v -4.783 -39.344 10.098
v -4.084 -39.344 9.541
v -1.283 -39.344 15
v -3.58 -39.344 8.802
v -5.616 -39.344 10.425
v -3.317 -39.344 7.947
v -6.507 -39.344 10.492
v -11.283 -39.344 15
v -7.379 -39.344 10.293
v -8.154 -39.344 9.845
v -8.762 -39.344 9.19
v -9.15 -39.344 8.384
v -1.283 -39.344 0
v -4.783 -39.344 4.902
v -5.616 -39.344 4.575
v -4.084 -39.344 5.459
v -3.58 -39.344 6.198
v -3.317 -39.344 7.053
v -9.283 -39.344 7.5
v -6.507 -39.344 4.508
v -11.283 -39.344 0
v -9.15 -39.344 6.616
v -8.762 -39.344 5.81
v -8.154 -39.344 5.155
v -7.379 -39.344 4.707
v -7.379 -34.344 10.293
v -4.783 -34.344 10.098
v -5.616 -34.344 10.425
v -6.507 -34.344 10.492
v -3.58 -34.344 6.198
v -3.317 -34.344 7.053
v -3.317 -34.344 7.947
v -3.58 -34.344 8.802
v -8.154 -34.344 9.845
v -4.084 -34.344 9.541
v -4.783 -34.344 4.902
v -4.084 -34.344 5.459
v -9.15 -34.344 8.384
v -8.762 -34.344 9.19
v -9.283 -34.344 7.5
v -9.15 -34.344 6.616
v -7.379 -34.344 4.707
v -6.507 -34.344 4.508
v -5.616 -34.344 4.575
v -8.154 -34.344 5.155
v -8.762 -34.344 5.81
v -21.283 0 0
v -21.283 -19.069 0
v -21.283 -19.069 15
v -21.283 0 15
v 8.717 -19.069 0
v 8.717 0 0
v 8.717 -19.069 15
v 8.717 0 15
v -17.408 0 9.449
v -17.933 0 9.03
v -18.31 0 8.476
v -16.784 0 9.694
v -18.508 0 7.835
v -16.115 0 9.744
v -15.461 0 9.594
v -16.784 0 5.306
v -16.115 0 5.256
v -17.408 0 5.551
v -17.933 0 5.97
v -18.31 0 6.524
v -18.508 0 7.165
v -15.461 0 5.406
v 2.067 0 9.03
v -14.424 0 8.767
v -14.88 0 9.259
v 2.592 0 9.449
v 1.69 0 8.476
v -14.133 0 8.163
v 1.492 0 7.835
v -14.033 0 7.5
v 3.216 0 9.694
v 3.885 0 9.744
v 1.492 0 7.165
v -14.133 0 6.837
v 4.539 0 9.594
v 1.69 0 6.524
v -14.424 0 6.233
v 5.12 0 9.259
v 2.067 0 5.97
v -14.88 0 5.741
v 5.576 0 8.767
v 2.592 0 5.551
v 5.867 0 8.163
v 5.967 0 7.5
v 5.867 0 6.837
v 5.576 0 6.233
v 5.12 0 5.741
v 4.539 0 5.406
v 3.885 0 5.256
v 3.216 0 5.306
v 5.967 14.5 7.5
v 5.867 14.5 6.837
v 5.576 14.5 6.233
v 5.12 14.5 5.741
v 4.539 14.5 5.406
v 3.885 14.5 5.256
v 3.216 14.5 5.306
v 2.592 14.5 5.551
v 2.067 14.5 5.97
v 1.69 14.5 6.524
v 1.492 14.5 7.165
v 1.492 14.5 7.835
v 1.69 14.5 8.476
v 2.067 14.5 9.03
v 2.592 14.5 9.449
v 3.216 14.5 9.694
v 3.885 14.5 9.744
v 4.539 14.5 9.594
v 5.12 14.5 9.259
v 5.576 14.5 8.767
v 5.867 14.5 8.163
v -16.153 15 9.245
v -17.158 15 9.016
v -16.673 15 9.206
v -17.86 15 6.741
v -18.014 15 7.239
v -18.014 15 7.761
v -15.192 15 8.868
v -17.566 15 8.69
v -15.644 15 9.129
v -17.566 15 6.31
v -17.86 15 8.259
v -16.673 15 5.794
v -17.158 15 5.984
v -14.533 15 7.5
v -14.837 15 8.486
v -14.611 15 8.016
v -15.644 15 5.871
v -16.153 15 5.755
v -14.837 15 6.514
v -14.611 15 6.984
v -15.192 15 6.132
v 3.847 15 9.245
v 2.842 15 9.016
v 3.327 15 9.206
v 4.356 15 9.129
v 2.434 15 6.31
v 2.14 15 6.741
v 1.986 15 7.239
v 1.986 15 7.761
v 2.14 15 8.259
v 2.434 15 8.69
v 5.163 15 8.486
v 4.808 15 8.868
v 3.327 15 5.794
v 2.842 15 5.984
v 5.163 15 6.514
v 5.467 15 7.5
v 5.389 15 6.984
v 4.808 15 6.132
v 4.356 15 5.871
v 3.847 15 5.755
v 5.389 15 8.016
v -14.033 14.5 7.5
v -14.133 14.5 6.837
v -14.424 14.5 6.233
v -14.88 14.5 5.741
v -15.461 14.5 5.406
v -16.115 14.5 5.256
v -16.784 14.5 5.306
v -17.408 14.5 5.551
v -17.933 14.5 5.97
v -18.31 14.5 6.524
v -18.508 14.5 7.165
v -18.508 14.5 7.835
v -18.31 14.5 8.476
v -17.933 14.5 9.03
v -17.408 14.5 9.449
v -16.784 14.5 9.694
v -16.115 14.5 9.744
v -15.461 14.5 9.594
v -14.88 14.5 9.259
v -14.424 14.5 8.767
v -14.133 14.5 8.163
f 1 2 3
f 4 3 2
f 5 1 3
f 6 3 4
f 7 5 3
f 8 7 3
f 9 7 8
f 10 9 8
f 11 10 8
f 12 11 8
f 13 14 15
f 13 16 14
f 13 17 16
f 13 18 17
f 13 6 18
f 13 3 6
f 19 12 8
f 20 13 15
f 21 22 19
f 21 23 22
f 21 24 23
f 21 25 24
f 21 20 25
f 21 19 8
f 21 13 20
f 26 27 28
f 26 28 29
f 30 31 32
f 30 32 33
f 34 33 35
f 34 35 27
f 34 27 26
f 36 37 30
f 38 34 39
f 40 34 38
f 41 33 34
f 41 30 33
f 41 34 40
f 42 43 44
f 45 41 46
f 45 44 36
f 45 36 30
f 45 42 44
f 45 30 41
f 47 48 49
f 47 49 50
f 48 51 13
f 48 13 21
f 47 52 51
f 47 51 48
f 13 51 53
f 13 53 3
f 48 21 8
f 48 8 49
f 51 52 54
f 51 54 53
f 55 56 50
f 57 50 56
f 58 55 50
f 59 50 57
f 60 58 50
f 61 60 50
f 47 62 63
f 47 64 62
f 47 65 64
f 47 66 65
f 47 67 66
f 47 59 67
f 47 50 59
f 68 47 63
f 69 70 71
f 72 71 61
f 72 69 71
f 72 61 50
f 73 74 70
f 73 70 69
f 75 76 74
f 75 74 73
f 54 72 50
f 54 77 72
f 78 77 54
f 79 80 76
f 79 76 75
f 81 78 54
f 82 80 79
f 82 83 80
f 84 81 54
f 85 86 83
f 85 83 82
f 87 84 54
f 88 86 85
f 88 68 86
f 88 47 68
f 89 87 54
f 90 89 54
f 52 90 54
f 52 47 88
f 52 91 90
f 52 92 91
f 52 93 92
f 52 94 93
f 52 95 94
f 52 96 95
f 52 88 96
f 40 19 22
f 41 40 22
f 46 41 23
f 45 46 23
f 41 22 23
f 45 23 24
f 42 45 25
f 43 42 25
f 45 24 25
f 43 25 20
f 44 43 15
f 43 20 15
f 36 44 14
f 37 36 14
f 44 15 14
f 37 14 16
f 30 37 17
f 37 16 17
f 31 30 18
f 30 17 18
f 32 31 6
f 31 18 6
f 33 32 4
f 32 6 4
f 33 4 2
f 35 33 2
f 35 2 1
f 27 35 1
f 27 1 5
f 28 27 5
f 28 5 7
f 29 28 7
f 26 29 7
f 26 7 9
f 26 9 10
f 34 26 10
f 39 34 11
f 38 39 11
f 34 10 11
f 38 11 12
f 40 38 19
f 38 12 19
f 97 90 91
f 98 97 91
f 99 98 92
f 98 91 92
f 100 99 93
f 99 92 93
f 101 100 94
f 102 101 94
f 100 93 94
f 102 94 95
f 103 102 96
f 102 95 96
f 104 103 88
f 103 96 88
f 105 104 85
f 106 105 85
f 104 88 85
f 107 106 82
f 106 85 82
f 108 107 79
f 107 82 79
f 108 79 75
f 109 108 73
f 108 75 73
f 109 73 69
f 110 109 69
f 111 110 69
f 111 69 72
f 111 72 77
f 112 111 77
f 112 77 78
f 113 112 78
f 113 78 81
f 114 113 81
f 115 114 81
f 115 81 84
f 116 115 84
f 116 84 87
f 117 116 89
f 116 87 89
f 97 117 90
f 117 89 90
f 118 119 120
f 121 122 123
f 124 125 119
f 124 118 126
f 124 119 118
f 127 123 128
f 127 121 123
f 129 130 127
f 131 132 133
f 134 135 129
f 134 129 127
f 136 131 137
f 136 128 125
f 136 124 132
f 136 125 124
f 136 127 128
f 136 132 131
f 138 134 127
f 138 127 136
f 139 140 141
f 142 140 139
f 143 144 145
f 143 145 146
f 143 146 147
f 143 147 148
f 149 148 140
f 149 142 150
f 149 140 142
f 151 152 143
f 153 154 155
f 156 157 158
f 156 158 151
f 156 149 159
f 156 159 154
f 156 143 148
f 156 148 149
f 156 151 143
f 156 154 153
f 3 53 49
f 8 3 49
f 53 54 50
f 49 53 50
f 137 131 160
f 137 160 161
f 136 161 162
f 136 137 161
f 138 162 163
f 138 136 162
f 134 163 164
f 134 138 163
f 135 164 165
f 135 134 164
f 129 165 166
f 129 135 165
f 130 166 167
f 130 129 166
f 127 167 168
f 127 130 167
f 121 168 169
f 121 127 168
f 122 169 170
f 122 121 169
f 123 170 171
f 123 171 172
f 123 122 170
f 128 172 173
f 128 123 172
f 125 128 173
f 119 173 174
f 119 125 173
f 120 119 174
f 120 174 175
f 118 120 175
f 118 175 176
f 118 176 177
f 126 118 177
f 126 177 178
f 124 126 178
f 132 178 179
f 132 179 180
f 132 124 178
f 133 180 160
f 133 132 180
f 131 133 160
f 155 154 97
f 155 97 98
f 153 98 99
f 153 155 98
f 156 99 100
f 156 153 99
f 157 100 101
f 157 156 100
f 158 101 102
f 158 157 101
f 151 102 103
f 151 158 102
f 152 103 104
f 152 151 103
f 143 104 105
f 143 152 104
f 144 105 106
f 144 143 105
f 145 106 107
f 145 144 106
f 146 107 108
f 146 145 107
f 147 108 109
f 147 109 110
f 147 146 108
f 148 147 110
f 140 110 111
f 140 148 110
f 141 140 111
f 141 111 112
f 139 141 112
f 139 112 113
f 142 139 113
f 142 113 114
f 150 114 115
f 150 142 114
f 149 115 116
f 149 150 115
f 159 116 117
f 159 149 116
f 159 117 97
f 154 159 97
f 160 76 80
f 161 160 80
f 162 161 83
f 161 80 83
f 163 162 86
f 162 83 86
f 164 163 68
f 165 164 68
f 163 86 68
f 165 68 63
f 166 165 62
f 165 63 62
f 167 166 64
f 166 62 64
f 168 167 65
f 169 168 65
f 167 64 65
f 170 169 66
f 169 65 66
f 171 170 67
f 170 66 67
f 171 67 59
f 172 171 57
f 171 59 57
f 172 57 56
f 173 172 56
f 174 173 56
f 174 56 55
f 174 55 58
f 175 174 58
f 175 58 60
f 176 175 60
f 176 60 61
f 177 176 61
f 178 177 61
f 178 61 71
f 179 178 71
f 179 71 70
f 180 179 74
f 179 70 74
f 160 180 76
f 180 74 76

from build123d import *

# Parameters (mm, degrees)
BOSS_EXTRUDE1_DEPTH = 15
SKETCH2_R           = 2.25
BOSS_EXTRUDE2_DEPTH = 15
CHAMFER4_SIZE       = 0.5
CHAMFER5_SIZE       = 0.5
SKETCH4_R           = 3
CUT_EXTRUDE1_DEPTH  = 5


with BuildPart() as part:
    # Sketch1 → Boss-Extrude1 (new body)
    with BuildSketch(Plane.XY):
        Polygon((-21.283297093, 0), (8.716702907, 0), (8.716702907, -19.069471621), (-1.283297093, -39.344386688), (-11.283297093, -39.344386688), (-21.283297093, -19.069471621), align=None)
    extrude(amount=BOSS_EXTRUDE1_DEPTH)

    # Sketch2 → Boss-Extrude2 (add)
    with BuildSketch(Plane(origin=(0, 0, 0), x_dir=(1, 0, 0), z_dir=(0, 1, 0))):
        with Locations((-16.283297093, -7.5)):
            Circle(SKETCH2_R)
        with Locations((3.716702907, -7.5)):
            Circle(SKETCH2_R)
    extrude(amount=BOSS_EXTRUDE2_DEPTH)

    # Chamfer4
    chamfer4_edges = [part.edges().sort_by_distance(p)[0] for p in [
        (-18.533297093, 15, 7.5),
    ]]
    chamfer(chamfer4_edges, length=CHAMFER4_SIZE)

    # Chamfer5
    chamfer5_edges = [part.edges().sort_by_distance(p)[0] for p in [
        (1.466702907, 15, 7.5),
    ]]
    chamfer(chamfer5_edges, length=CHAMFER5_SIZE)

    # Sketch4 → Cut-Extrude1 (cut)
    with BuildSketch(Plane(origin=(0, -39.344386688, 0), x_dir=(-1, 0, 0), z_dir=(0, -1, 0))):
        with Locations((6.283297093, -7.5)):
            Circle(SKETCH4_R)
    extrude(amount=-CUT_EXTRUDE1_DEPTH, mode=Mode.SUBTRACT)


solid = part.part
